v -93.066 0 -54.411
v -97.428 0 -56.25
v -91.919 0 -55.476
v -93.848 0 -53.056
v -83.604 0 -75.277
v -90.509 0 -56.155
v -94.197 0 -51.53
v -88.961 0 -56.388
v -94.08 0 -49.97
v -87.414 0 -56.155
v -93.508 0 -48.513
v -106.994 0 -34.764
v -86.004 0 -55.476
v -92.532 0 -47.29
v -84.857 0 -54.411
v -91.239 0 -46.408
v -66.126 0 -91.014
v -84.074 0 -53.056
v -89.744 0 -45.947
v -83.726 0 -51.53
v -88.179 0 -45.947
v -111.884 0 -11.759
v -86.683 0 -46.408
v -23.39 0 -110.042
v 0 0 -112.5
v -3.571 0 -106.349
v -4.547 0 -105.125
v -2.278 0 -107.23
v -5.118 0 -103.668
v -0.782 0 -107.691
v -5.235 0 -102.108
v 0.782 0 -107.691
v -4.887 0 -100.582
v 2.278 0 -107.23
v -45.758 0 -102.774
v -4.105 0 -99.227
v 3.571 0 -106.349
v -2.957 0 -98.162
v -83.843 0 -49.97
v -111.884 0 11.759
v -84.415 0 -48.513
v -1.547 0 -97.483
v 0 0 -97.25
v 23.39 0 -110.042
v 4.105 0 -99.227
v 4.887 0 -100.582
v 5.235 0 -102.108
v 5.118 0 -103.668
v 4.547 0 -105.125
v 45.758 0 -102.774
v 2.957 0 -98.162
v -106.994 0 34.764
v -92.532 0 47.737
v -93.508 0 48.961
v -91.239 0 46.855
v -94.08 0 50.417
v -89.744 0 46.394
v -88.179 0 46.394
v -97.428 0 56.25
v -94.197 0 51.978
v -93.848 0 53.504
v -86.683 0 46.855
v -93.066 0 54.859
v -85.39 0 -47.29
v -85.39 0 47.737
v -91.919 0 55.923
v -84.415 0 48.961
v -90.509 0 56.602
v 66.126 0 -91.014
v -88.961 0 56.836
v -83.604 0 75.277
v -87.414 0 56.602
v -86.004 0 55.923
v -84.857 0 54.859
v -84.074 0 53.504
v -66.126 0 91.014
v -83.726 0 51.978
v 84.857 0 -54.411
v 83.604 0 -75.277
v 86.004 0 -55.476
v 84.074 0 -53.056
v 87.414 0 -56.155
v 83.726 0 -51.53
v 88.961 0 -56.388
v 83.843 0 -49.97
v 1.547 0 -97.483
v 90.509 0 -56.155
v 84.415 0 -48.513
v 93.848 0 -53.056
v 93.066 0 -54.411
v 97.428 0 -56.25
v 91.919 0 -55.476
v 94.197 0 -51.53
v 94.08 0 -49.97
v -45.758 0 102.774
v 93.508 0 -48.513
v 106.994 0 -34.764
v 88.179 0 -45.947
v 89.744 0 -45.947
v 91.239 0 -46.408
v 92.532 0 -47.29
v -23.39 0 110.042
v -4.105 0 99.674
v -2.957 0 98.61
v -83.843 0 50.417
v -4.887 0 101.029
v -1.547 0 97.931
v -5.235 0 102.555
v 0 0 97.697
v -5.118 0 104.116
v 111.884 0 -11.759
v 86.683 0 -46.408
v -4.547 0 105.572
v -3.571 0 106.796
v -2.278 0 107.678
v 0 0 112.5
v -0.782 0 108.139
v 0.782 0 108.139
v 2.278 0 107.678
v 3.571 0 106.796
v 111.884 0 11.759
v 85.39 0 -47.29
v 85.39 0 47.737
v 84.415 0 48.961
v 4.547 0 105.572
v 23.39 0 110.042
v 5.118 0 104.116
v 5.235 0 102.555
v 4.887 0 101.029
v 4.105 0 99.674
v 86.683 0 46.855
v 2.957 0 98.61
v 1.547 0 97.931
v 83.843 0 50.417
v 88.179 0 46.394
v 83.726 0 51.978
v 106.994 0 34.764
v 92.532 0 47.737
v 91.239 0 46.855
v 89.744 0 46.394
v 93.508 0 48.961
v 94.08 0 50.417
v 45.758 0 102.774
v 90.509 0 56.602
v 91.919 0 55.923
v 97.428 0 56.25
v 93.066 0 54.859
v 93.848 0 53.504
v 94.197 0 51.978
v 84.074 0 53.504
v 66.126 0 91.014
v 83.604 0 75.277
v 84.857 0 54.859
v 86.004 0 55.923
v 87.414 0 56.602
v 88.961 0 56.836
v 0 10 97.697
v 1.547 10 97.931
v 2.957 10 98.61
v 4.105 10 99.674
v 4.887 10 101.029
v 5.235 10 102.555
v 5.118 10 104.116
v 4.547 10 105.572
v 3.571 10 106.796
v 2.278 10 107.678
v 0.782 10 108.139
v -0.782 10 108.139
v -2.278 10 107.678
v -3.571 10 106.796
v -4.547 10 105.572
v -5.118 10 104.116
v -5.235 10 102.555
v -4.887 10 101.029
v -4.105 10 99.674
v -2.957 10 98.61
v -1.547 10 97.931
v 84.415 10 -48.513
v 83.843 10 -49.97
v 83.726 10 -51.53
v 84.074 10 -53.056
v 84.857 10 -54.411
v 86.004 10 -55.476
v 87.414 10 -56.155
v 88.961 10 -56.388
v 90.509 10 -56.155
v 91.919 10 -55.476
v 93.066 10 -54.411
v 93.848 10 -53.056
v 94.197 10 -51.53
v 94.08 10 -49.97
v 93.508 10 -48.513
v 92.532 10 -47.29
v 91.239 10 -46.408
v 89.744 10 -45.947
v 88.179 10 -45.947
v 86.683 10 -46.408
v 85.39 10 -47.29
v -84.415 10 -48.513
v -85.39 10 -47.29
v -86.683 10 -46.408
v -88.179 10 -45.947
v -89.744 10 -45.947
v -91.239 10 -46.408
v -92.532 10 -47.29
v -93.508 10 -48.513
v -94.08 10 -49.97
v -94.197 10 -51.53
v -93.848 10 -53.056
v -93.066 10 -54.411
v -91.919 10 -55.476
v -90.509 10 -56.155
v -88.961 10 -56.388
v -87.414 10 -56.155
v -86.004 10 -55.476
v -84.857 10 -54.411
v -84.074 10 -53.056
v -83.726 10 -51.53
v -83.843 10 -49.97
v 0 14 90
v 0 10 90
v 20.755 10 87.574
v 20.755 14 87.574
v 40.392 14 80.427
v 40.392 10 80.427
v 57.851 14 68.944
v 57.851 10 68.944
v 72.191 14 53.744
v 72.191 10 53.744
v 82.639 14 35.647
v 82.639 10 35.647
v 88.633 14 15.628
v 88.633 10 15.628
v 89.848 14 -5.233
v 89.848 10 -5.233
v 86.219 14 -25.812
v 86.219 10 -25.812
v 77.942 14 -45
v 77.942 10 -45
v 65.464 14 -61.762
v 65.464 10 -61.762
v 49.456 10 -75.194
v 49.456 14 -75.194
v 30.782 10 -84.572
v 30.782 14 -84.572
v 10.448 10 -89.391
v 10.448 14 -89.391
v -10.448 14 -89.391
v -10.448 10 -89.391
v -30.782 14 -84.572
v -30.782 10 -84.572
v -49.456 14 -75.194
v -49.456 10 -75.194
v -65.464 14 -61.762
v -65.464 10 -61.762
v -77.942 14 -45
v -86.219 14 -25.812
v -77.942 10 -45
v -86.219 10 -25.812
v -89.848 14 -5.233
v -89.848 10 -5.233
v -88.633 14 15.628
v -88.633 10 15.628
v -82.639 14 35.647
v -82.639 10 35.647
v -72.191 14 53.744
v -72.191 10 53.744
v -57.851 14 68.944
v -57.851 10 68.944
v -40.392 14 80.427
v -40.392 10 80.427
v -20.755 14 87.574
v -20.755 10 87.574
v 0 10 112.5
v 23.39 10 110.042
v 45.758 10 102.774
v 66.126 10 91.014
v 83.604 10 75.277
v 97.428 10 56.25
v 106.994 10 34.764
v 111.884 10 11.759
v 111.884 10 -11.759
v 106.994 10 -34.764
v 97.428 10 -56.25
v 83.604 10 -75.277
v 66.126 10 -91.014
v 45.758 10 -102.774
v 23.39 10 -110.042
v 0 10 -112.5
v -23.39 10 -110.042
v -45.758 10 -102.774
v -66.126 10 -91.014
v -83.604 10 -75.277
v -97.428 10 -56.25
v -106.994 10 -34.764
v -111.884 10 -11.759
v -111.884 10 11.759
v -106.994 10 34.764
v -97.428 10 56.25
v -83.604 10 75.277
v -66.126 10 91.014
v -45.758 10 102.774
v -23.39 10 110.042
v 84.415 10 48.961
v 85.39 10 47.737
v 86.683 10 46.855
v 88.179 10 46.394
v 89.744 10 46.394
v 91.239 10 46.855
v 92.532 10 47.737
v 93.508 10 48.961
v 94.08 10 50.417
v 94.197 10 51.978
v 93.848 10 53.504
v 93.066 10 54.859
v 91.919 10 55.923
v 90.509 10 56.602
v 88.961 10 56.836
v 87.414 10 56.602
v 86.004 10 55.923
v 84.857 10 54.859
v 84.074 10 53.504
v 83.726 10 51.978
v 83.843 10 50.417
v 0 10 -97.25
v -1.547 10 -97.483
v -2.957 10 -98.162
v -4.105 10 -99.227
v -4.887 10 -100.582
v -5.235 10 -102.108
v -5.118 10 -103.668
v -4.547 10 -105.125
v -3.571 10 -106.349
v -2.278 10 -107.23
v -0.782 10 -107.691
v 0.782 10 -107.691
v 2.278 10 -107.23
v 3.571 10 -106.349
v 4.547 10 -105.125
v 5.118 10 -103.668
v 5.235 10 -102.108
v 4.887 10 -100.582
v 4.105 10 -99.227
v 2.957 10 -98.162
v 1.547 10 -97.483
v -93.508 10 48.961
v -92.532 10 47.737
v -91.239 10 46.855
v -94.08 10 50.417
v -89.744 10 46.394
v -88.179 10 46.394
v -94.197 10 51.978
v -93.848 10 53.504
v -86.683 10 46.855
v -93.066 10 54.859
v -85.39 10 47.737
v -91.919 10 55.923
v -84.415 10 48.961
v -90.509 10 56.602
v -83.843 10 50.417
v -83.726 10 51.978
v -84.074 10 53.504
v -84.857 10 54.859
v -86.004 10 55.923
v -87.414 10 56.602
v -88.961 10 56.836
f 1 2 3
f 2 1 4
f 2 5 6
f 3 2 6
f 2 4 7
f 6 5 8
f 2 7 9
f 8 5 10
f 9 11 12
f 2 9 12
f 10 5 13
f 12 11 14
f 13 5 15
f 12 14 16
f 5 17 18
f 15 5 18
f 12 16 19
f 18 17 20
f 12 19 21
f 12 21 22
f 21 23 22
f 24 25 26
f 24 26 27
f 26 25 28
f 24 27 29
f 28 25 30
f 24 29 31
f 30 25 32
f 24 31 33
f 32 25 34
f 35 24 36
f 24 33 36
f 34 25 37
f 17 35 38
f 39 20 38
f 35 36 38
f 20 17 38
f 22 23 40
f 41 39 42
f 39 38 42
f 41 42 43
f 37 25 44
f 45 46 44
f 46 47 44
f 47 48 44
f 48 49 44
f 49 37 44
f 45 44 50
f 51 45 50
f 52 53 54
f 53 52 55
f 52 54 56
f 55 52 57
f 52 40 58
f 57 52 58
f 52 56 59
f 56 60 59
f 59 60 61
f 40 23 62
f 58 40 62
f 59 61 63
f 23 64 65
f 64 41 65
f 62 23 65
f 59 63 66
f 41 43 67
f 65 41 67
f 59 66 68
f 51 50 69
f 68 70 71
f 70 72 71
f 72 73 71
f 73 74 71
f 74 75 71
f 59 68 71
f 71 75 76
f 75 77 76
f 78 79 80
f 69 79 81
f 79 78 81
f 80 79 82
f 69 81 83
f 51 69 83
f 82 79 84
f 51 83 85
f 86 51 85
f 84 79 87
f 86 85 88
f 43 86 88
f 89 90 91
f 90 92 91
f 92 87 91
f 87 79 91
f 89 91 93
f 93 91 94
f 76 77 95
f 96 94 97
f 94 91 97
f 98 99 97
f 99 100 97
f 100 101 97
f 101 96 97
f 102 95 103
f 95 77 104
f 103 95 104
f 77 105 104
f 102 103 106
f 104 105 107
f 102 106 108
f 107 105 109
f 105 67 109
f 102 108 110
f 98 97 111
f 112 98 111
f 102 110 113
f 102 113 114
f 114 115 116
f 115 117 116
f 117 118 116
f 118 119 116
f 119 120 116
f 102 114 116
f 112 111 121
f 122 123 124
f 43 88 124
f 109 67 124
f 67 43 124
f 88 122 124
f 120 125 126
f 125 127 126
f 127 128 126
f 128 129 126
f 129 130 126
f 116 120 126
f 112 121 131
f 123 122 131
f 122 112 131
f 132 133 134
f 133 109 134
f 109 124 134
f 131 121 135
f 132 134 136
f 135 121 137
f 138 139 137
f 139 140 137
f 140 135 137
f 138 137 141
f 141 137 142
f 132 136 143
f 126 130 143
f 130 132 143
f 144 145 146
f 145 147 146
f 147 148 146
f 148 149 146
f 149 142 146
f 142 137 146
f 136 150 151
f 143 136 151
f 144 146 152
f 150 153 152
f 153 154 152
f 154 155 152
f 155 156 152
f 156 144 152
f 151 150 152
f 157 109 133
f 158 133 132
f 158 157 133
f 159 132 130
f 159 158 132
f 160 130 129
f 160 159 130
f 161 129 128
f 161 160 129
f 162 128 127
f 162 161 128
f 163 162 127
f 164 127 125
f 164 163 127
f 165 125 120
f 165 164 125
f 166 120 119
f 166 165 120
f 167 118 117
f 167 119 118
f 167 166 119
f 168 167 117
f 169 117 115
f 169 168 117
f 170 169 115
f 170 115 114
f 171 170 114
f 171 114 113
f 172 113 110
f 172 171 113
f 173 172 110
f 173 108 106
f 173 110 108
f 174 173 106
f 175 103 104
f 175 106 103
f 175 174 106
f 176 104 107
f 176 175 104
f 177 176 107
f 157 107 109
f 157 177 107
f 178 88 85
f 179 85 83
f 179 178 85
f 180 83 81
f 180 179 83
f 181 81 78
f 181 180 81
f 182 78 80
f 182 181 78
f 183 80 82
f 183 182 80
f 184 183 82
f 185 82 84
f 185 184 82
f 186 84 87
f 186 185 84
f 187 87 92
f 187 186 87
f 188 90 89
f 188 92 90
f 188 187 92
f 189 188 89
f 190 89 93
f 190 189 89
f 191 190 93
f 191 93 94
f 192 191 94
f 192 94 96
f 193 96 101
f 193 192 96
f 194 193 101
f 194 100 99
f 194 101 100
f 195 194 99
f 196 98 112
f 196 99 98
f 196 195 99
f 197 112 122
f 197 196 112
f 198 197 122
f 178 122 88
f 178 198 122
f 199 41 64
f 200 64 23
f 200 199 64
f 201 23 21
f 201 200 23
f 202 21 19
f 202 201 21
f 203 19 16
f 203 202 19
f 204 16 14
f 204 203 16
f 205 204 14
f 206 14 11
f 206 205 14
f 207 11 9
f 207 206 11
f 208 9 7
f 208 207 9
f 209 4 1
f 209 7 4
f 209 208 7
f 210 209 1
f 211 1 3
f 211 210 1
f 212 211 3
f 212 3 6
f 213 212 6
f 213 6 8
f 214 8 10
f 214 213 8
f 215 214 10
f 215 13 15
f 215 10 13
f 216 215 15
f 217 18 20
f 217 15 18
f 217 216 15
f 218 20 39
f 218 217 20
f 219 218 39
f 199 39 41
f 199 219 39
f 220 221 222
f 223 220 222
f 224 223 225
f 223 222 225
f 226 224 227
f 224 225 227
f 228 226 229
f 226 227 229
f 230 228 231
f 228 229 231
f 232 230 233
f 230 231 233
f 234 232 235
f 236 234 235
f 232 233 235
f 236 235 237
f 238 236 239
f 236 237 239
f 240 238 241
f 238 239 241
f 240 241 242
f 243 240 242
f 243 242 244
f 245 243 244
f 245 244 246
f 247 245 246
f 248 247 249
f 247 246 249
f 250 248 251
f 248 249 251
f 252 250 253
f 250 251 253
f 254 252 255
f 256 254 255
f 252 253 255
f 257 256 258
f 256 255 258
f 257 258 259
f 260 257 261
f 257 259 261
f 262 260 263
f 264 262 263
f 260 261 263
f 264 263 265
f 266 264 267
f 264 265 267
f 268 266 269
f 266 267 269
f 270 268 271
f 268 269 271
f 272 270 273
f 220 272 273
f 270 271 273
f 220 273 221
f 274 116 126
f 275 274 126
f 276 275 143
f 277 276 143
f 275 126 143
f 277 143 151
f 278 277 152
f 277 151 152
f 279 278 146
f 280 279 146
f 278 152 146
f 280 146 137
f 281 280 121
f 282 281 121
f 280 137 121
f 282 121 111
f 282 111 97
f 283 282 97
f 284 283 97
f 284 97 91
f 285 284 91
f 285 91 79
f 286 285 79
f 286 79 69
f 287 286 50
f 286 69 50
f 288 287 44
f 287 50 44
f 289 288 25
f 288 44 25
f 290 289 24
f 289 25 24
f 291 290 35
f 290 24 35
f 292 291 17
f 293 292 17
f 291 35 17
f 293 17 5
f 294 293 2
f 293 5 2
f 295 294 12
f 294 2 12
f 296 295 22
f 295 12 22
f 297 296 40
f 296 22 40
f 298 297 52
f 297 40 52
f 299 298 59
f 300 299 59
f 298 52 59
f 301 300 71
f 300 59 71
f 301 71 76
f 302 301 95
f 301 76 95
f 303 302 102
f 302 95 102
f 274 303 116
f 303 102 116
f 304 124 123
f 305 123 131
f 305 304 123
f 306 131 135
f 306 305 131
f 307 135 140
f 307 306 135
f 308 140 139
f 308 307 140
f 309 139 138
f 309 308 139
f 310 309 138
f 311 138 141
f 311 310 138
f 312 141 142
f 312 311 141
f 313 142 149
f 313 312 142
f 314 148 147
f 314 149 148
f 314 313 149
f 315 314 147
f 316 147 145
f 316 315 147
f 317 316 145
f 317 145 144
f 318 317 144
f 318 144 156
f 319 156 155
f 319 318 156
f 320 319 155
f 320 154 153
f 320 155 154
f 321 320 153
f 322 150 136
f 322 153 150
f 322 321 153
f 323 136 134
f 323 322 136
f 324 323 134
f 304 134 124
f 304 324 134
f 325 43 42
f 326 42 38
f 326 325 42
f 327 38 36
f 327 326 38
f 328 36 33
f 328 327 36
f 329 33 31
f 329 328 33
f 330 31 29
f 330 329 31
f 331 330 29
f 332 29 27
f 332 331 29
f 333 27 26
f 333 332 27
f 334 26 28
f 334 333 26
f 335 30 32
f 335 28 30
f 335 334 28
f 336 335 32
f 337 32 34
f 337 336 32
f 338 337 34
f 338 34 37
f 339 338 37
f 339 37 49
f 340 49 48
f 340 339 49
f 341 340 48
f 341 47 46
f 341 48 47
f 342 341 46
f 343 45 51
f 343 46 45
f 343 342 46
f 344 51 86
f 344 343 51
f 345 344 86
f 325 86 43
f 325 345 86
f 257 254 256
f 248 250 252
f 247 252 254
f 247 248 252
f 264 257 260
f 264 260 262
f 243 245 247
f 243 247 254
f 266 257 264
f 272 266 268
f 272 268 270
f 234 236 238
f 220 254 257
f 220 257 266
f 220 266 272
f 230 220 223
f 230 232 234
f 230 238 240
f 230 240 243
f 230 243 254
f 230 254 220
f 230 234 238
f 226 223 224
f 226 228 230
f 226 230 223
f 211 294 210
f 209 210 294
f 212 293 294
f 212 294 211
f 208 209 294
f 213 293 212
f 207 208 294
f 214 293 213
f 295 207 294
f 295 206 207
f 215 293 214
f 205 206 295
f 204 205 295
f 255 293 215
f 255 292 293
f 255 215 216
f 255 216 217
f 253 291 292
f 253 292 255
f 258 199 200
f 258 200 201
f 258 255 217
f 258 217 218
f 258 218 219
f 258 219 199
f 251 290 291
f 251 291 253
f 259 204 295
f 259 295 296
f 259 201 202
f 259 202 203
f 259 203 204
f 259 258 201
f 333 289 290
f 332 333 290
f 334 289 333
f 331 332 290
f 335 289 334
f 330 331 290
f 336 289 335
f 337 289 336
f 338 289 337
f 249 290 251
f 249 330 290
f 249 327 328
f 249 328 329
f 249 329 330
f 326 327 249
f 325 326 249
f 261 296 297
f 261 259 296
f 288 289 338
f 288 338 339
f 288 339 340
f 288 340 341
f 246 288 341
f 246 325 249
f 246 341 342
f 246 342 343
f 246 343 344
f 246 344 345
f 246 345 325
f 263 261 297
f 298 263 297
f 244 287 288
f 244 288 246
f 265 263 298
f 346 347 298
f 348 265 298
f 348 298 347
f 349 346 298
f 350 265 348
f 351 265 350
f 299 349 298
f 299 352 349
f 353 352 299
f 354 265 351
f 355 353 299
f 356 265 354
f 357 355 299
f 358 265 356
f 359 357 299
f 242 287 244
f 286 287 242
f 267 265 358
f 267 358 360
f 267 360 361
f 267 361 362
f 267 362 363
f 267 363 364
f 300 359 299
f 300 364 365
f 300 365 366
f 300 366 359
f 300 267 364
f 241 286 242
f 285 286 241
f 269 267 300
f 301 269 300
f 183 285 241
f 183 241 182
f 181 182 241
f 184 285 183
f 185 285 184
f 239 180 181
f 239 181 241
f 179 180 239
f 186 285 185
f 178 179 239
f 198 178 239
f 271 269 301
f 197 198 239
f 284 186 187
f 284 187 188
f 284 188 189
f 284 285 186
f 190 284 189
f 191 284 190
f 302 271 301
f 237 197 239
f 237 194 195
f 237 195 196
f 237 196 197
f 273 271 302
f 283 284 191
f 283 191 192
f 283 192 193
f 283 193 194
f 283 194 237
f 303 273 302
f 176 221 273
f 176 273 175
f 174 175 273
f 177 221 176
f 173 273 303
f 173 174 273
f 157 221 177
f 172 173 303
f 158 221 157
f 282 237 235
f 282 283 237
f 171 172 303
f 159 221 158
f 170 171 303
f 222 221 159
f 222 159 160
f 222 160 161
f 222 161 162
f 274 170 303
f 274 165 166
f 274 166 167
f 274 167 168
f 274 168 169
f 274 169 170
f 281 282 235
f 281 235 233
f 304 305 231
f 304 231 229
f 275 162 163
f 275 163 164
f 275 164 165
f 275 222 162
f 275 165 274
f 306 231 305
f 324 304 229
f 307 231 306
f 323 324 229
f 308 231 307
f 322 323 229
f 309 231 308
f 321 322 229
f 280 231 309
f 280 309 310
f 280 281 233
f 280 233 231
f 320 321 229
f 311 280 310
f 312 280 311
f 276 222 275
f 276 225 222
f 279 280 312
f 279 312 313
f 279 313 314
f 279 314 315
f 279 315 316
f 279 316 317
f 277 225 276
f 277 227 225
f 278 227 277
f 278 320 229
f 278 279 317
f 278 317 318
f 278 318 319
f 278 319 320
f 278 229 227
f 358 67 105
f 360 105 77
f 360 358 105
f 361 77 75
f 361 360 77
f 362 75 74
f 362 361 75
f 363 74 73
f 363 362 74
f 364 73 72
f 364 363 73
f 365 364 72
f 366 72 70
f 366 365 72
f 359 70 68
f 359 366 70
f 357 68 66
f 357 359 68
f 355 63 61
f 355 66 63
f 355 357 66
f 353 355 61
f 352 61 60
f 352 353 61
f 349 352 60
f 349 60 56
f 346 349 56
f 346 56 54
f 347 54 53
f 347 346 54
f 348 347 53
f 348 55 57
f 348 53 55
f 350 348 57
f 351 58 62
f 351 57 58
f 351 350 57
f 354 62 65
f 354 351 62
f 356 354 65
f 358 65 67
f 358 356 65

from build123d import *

# Parameters (mm, degrees)
CROQUIS1_R              = 112.5
SALIENTE_EXTRUIR1_DEPTH = 10
MATRIZC1_COUNT          = 6
CROQUIS6_R              = 90
SALIENTE_EXTRUIR2_DEPTH = 4


with BuildPart() as part:
    # Croquis1 → Saliente-Extruir1 (new body)
    with BuildSketch(Plane(origin=(0, 0, 0), x_dir=(1, 0, 0), z_dir=(0, 1, 0))):
        with Locations(Location((0, 0, 0), (0, 0, 270))):
            Circle(CROQUIS1_R)
    extrude(amount=SALIENTE_EXTRUIR1_DEPTH)

    # Croquis5 → Taladro roscado M12x1.51 (revolve, cut)
    with BuildSketch(Plane(origin=(0, 10, -102.5), x_dir=(0, 0, 1), z_dir=(1, 0, 0))):
        Polygon((0, 0), (0, 34.65451825), (5.25, 31.5), (5.25, 0), align=None)
    taladro_roscado_m12x1_51 = revolve(axis=Axis((0, 16.35, -102.5), (0, -1, 0)), mode=Mode.SUBTRACT)

    # MatrizC1: Taladro roscado M12x1.51 ×6 about axis
    matrizc1_axis = Axis((0, 0, 0.223709412), (0, 1, 0))
    for i in range(1, MATRIZC1_COUNT):
        add(taladro_roscado_m12x1_51.rotate(matrizc1_axis, i * 360 / MATRIZC1_COUNT), mode=Mode.SUBTRACT)

    # Croquis6 → Saliente-Extruir2 (add)
    with BuildSketch(Plane(origin=(0, 10, 0), x_dir=(1, 0, 0), z_dir=(0, 1, 0))):
        with Locations(Location((0, 0, 0), (0, 0, 270))):
            Circle(CROQUIS6_R)
    extrude(amount=SALIENTE_EXTRUIR2_DEPTH)


solid = part.part
